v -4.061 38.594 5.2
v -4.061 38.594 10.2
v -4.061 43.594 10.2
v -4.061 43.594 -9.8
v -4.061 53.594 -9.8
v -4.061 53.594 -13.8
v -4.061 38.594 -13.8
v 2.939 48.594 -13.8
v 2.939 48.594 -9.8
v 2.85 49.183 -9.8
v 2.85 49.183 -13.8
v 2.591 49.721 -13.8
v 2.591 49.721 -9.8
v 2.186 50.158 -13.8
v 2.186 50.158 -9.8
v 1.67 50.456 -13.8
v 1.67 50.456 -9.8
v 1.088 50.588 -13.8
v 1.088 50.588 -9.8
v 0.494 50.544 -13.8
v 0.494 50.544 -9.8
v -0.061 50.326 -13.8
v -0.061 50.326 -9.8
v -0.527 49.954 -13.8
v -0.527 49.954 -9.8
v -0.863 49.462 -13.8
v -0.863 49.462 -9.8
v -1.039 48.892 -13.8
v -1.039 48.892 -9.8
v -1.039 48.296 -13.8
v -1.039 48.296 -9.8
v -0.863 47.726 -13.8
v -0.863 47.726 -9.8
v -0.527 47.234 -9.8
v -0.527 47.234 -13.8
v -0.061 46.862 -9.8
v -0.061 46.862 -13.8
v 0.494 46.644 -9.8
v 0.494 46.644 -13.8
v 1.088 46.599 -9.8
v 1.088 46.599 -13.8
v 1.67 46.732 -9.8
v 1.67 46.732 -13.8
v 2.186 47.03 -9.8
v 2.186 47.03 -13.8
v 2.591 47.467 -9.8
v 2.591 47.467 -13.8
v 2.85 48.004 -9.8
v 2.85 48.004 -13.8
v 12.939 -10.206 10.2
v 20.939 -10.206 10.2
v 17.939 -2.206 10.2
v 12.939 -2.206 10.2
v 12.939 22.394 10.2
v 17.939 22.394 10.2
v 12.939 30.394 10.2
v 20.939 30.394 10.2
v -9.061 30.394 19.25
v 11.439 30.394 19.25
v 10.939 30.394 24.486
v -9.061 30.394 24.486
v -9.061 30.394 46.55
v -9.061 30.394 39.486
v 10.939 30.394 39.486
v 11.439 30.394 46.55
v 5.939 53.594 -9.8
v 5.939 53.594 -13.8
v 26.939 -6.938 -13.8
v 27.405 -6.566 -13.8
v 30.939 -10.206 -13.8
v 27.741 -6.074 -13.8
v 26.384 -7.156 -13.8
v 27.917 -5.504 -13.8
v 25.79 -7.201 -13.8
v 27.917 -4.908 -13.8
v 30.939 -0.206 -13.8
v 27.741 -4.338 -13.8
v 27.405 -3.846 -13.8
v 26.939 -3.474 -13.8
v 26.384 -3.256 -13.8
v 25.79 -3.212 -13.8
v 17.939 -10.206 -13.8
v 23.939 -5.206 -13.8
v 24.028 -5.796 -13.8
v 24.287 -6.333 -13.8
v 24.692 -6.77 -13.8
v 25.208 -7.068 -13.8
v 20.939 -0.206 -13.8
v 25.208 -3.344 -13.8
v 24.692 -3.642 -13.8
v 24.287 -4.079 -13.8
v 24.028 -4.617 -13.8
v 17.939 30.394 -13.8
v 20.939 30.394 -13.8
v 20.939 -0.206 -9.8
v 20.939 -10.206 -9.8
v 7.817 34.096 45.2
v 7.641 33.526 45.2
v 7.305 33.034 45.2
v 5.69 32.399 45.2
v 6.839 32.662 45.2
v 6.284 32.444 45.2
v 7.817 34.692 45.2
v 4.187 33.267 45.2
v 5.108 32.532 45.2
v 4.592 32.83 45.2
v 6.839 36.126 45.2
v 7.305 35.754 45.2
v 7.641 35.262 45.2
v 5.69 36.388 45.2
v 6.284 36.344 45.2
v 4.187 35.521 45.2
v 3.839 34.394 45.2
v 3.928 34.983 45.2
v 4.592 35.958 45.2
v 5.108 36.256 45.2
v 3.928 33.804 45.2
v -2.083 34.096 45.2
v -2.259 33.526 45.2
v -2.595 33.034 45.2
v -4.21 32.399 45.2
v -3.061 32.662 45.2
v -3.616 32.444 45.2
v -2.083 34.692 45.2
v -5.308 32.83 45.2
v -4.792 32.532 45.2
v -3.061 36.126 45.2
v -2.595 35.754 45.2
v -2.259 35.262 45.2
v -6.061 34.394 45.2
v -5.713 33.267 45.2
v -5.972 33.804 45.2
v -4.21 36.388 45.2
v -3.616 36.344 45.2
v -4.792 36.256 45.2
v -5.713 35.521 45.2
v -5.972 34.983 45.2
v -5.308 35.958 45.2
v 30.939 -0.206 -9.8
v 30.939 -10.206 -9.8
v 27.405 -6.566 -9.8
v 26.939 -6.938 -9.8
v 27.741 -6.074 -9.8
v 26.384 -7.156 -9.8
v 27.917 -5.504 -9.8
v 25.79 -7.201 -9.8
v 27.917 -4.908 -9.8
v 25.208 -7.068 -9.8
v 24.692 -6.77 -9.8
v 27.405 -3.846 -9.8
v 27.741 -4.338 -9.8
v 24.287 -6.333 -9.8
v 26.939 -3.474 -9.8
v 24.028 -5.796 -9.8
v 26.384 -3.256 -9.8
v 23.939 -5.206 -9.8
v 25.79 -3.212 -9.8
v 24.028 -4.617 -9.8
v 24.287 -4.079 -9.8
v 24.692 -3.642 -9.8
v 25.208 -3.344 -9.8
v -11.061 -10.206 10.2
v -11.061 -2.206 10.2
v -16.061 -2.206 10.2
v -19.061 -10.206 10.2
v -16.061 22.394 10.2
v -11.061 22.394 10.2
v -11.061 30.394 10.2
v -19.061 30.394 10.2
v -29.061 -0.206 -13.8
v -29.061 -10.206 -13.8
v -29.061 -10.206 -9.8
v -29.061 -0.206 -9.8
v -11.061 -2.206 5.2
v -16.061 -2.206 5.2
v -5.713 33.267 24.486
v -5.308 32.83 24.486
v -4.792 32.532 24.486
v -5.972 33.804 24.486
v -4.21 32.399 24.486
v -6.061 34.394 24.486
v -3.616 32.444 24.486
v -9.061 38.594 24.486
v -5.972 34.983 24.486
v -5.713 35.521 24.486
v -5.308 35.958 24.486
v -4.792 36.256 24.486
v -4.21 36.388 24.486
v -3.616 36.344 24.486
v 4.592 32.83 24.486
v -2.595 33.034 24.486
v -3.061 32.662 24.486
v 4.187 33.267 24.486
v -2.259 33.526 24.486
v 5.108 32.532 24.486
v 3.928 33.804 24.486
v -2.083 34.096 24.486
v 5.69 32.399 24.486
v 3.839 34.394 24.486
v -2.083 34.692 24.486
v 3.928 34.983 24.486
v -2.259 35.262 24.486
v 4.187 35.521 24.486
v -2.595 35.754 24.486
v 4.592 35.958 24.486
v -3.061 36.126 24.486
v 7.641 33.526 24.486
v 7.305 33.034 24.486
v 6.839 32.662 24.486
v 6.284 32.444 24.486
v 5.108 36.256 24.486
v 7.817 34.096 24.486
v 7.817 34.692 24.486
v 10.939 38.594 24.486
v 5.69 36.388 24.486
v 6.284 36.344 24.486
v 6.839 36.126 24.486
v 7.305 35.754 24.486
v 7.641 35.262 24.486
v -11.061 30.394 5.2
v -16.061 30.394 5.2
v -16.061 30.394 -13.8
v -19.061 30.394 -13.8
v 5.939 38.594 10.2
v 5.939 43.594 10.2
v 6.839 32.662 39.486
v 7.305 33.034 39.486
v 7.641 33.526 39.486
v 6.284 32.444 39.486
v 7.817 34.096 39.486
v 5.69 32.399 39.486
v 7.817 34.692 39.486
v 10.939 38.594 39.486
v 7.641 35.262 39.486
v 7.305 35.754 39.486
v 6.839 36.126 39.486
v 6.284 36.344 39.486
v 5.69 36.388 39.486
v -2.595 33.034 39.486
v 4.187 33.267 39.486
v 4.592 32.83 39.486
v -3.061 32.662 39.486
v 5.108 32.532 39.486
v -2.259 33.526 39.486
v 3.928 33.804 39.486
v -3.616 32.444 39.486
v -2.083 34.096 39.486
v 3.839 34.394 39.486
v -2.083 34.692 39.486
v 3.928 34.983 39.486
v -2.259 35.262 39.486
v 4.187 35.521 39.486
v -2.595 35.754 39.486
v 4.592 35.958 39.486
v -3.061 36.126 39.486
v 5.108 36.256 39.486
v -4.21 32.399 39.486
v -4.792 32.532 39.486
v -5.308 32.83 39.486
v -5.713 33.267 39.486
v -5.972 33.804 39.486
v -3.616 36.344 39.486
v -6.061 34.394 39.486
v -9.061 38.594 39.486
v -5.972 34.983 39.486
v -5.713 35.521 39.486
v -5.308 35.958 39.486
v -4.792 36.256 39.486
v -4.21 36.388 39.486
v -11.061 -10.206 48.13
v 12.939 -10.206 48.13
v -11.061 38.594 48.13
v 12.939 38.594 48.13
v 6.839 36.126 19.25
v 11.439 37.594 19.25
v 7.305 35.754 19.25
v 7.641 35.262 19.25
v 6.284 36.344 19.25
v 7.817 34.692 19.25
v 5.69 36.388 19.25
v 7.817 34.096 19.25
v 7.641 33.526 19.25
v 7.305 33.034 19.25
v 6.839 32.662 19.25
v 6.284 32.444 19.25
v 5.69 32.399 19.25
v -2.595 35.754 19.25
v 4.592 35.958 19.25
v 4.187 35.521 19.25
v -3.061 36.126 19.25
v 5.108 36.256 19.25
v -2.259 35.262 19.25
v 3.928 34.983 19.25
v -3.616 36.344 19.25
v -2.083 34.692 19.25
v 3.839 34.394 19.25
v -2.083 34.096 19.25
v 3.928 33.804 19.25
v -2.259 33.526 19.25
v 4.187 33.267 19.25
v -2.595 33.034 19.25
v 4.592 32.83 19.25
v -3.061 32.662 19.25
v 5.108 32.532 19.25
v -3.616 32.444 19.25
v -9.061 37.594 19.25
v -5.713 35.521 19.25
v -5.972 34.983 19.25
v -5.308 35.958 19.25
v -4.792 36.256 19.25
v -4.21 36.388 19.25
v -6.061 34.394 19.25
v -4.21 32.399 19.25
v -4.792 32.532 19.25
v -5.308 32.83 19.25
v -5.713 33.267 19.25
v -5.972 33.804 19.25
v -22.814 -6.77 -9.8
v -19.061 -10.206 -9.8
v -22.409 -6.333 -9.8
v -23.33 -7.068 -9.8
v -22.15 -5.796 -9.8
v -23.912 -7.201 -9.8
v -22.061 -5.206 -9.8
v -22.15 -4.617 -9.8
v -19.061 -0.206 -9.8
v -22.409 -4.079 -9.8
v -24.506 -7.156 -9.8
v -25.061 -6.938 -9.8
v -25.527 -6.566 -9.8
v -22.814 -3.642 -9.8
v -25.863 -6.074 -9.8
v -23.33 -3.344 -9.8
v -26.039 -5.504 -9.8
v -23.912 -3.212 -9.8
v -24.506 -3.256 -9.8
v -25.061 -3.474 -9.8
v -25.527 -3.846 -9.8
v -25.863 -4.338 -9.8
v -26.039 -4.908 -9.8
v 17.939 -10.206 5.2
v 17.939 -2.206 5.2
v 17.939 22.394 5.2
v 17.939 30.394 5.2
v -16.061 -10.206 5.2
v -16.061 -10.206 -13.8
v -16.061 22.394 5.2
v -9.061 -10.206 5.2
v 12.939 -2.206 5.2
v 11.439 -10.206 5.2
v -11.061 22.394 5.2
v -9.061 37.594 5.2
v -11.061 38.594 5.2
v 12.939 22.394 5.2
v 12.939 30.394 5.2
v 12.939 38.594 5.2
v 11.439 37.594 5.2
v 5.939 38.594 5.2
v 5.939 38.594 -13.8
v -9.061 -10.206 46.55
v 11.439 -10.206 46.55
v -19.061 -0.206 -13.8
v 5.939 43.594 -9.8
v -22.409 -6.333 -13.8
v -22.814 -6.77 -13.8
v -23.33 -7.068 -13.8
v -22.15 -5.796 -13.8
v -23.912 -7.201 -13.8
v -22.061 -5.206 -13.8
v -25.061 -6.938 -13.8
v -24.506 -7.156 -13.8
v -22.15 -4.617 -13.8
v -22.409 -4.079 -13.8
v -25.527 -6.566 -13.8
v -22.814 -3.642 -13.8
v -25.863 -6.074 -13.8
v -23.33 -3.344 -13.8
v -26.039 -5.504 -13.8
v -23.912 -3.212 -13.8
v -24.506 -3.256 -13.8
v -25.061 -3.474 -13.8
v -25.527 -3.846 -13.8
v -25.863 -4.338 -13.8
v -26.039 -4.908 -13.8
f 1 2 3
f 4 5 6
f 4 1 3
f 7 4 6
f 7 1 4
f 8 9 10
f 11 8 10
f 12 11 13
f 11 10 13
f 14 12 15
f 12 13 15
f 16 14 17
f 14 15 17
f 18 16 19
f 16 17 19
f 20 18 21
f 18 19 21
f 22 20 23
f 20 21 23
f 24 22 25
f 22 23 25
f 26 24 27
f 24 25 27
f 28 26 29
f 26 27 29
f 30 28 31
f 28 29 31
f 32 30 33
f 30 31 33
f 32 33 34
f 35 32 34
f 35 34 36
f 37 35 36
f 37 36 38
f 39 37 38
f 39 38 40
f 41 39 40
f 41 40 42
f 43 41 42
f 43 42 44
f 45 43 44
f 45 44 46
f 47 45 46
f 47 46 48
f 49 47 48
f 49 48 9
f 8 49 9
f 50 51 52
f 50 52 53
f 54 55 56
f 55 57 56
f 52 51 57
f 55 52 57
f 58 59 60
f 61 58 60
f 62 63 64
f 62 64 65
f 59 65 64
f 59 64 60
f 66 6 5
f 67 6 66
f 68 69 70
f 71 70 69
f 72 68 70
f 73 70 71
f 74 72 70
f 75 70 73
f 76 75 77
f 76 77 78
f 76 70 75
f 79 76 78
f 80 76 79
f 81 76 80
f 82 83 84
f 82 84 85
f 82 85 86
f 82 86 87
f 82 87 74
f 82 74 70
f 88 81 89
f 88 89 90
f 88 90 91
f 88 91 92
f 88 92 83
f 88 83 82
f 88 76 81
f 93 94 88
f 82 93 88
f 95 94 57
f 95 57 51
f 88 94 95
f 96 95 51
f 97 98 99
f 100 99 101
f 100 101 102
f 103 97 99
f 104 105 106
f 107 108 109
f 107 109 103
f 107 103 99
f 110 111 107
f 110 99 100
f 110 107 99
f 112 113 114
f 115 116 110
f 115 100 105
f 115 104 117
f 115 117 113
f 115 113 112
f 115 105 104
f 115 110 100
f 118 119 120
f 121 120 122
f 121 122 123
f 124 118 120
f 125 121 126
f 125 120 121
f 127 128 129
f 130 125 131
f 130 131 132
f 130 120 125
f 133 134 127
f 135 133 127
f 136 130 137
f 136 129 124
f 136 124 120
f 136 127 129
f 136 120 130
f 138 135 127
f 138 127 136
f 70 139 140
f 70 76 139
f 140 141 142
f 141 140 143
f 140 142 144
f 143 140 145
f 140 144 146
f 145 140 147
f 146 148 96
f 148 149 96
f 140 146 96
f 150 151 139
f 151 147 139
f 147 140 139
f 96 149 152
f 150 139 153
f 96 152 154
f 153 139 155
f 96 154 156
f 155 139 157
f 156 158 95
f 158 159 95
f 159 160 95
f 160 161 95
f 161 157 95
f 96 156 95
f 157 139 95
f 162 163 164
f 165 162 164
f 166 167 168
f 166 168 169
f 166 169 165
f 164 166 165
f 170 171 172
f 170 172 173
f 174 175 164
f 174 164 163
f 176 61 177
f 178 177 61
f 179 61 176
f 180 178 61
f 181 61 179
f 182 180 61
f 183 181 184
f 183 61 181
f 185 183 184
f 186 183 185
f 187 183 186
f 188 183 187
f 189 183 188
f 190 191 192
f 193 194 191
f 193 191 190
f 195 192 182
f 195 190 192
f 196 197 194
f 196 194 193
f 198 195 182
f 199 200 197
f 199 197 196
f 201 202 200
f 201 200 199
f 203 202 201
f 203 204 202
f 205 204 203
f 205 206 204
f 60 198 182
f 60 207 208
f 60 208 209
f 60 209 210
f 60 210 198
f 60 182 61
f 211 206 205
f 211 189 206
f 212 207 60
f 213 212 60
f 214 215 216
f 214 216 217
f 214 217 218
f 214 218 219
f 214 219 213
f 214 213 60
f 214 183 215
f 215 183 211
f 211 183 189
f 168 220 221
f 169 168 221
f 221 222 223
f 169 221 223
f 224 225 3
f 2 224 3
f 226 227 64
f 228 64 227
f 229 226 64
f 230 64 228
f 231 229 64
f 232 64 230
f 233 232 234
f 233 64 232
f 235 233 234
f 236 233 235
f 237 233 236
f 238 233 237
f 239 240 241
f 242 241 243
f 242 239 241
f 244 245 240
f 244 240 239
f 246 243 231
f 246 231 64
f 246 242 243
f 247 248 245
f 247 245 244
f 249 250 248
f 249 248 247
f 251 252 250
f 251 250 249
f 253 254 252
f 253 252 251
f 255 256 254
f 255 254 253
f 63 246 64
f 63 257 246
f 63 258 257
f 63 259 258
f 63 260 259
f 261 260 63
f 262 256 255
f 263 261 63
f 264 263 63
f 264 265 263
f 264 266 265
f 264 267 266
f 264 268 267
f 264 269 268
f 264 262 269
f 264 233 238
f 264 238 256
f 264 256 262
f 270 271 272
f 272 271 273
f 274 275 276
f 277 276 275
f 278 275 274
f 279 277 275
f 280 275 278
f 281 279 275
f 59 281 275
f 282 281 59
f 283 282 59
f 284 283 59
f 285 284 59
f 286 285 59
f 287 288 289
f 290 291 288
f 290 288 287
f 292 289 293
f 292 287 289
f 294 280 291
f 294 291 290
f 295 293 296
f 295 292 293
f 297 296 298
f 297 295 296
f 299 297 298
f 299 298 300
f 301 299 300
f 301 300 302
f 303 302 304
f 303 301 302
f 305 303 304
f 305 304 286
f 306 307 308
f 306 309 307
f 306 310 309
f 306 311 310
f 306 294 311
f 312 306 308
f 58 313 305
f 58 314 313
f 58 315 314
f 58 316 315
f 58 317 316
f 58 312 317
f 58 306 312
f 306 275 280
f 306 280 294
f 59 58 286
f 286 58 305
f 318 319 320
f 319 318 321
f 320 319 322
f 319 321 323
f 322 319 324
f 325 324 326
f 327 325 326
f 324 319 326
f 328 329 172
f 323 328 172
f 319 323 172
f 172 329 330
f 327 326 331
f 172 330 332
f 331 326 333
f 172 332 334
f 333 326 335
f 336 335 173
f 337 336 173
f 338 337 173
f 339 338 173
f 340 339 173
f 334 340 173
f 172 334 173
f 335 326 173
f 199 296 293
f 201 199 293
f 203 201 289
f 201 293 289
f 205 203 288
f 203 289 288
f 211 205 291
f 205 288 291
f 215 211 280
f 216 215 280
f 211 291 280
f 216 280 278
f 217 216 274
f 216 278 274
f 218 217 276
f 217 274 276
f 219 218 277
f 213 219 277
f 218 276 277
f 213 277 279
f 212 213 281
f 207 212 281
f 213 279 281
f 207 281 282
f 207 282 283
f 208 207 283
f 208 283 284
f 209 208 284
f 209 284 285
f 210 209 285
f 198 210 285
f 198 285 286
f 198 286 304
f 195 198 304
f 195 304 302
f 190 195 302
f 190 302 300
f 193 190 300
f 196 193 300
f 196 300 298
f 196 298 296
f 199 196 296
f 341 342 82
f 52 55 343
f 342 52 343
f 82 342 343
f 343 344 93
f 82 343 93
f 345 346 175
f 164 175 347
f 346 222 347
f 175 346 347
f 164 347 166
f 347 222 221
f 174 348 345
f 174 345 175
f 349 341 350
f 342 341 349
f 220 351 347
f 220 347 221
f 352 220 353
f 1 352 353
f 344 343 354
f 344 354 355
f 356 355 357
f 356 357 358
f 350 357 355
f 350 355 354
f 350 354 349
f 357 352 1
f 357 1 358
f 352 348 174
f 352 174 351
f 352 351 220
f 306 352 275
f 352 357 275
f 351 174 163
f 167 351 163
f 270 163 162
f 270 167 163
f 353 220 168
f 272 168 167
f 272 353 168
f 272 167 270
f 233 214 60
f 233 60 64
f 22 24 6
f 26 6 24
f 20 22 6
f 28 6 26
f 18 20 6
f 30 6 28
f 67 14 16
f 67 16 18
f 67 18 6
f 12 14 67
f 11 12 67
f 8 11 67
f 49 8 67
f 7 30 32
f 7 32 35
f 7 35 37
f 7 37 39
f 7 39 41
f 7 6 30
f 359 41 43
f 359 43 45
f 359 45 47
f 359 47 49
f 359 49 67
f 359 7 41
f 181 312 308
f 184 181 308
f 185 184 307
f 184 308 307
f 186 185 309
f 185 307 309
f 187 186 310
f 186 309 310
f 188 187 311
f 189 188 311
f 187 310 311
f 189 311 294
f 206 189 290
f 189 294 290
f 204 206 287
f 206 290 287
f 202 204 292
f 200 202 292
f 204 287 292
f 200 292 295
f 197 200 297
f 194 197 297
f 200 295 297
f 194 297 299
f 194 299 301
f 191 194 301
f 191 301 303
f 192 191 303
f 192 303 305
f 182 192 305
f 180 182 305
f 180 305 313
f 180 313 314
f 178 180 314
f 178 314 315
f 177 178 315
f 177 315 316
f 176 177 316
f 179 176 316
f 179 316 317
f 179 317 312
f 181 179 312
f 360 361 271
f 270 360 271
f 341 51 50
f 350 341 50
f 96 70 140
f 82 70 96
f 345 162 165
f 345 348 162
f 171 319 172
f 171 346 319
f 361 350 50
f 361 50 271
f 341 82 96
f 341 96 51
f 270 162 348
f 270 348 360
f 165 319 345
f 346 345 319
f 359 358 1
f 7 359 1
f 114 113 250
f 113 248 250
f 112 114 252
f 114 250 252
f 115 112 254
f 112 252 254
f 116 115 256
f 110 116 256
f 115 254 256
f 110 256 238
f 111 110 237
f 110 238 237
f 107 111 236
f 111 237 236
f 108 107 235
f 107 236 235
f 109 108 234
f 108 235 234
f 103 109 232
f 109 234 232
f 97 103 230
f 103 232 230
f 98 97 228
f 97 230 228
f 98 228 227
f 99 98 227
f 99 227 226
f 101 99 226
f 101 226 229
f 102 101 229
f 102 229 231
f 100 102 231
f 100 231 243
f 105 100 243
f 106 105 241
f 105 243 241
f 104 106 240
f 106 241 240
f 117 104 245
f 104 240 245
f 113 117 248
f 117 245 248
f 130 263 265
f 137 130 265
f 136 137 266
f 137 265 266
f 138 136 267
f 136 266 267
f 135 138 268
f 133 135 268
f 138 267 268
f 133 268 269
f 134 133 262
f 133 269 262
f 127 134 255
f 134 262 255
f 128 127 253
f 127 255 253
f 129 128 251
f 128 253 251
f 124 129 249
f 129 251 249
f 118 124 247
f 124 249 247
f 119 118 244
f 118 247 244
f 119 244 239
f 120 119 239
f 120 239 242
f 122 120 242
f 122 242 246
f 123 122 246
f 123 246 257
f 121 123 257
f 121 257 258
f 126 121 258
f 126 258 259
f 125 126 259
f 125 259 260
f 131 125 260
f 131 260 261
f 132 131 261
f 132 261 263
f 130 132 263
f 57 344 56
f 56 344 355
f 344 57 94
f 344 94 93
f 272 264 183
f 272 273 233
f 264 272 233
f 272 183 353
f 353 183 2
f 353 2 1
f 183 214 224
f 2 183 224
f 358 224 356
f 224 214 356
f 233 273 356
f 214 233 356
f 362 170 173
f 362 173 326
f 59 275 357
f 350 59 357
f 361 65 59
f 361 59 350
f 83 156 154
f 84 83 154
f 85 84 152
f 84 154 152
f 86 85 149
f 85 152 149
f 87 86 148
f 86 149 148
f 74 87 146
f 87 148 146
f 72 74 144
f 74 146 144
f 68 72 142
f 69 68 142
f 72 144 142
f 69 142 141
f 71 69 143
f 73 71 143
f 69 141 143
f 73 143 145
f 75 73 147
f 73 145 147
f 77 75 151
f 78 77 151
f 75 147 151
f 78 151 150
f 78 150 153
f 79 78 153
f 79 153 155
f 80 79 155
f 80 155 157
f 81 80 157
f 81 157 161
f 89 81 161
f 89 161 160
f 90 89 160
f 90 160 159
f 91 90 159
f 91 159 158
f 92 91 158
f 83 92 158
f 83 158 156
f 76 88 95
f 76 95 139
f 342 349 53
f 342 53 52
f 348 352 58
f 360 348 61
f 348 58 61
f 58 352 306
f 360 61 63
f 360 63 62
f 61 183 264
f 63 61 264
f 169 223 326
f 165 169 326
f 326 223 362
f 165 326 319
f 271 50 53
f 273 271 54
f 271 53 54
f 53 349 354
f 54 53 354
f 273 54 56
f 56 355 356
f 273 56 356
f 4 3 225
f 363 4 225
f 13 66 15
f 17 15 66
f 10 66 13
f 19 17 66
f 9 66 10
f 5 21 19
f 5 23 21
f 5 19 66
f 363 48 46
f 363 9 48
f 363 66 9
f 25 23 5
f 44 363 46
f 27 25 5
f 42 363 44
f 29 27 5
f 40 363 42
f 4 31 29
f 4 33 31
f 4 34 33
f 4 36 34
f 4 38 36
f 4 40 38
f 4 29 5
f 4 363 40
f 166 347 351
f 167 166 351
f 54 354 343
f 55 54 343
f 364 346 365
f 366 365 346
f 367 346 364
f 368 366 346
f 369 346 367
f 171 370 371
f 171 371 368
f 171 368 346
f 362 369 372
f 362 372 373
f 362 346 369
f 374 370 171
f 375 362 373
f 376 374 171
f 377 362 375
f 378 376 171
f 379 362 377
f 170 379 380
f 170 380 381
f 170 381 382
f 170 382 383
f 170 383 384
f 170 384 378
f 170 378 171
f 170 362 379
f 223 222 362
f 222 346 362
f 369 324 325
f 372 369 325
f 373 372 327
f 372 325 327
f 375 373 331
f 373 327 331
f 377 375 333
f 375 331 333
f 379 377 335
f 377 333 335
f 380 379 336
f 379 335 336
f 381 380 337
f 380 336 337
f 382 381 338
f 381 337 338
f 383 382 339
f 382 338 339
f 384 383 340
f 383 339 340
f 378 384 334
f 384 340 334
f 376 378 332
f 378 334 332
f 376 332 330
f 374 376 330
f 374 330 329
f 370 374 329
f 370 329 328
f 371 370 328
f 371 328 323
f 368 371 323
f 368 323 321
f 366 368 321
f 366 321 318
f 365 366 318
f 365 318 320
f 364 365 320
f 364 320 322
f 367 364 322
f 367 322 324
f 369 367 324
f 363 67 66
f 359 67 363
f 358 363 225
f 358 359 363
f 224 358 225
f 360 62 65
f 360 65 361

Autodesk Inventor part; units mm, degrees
ref_plane "YZ Plane" through (0, 0, 0) normal (1, 0, 0) x (0, 1, 0)
ref_plane "XZ Plane" through (0, 0, 0) normal (0, 1, 0) x (-1, 0, 0)
ref_plane "작업 평면1" through (-9.061, -9.3, 6.3) normal (-1, 0, 0) x (0, 1, 0)
sketch "스케치1" plane through (-9.061, -9.3, 6.3) normal (-1, 0, 0) x (0, 1, 0)
  line L0 (39.3939, -39.95) -> (-0.6061, -39.95)
  line L1 (-0.6061, 0.55) -> (39.3939, 0.55)
  line L2 (-0.6061, -12.65) -> (-7.8061, -12.65)
  line L3 (-7.8061, -12.65) -> (-7.8061, -9.45)
  line L4 (-7.8061, -9.45) -> (-0.6061, -9.45)
  line L5 (19.3939, -39.95) -> (19.3939, 0.55) construction
  line L6 (39.3939, -12.65) -> (46.5939, -12.65)
  line L7 (46.5939, -12.65) -> (46.5939, -9.45)
  line L8 (46.5939, -9.45) -> (39.3939, -9.45)
  line L9 (-0.6061, -39.95) -> (-0.6061, -12.65)
  line L10 (-0.6061, -9.45) -> (-0.6061, 0.55)
  line L11 (39.3939, 0.55) -> (39.3939, -9.45)
  line L12 (39.3939, -12.65) -> (39.3939, -39.95)
  line L13 (-9.1061, 1.1) -> (47.8939, 1.1)
  line L14 (39.6939, 1.1) -> (39.6939, -9.15)
  line L15 (39.6939, -9.15) -> (46.8939, -9.15)
  line L16 (46.8939, -9.15) -> (46.8939, -12.95)
  line L17 (46.8939, -12.95) -> (39.6939, -12.95)
  line L18 (39.6939, -12.95) -> (39.6939, -40.25)
  line L19 (39.6939, -40.25) -> (-0.9061, -40.25)
  line L20 (-0.9061, -40.25) -> (-0.9061, -12.95)
  line L21 (-0.9061, -12.95) -> (-8.1061, -12.95)
  line L22 (-8.1061, -12.95) -> (-8.1061, -9.15)
  line L23 (-8.1061, -9.15) -> (-0.9061, -9.15)
  line L24 (-0.9061, -9.15) -> (-0.9061, 1.1)
  line L25 (47.8939, 2.4305) -> (-9.1061, 2.4305)
  line L26 (-9.1061, 2.4305) -> (-9.1061, -41.8305)
  line L27 (-9.1061, -41.8305) -> (47.8939, -41.8305)
  line L28 (47.8939, -41.8305) -> (47.8939, 2.4305)
  line L29 (39.3939, -19.7) -> (-0.6061, -19.7) construction
  line L30 (39.6939, -26.25) -> (39.6939, -30.25)
  line L31 (-0.8061, 6.3) -> (19.1939, 6.3) projected
  line L32 (7.6194, 1.8) -> (13.6194, 1.8)
  line L33 (7.6194, 1.8) -> (13.6194, 1.8)
  line L34 (7.6194, 1.8) -> (13.6194, 1.8)
  line L35 (-0.9061, -31.1) -> (-4.9061, -31.1)
  line L36 (-4.9061, -31.1) -> (-4.9061, -36.1)
  line L37 (-4.9061, -36.1) -> (-0.9061, -36.1)
  line L38 (6.1939, 1.8) -> (12.1939, 1.8) projected
  point P0 (19.3939, -19.7)
  point P1 (9.1939, 6.3)
  dimension "d0" = 40.5
  dimension "d1" = 40
  dimension "d2" = 3.2
  dimension "d3" = 27.2
  dimension "d6" = 27.3
  dimension "d8" = 0.3
  dimension "d9" = 20.25
  dimension "d23" = 9.8
  dimension "d24" = 26
  dimension "d26" = 5
  dimension "d27" = 4
  dimension "d28" = 4.15
extrude "돌출1" add sketch "스케치1" against normal blind 22 contours L13 L24 L23 L22 L21 L20 L35 L36 L37 L19 L18 L17 L16 L15 L14 L28 L27 L26 | L20 L37 L36 L35
sketch "스케치4" plane through (12.939, -9.3, 6.3) normal (1, 0, 0) x (0, 0, -1)
  line L0 (-12.95, -0.9061) -> (-40.25, -0.9061) projected
  line L1 (-31.1, -0.9061) -> (-31.1, -4.9061) projected
  line L2 (-31.1, -4.9061) -> (-36.1, -4.9061) projected
  line L3 (-36.1, -4.9061) -> (-36.1, -0.9061) projected
  line L4 (-40.25, -0.9061) -> (-12.95, -0.9061) projected
  line L5 (-41.8305, -9.1061) -> (1.1, -9.1061) projected
  line L6 (-31.1, -4.9061) -> (-31.1, -9.1061)
  line L7 (-36.1, -4.9061) -> (-36.1, -9.1061)
  point P0 (6.3, 9.3)
extrude "돌출4" cut sketch "스케치4" against normal blind 22
sketch "스케치2" plane through (-9.061, -9.3, 6.3) normal (-1, 0, 0) x (0, 0, 1)
  line L0 (-1.1, -0.9061) -> (-1.1, -9.1061) projected
  line L1 (-1.1, -9.1061) -> (41.8305, -9.1061) projected
  line L2 (41.8305, -9.1061) -> (41.8305, 47.8939) projected
  line L3 (41.8305, 47.8939) -> (-1.1, 47.8939) projected
  line L4 (-1.1, 47.8939) -> (-1.1, 39.6939) projected
  line L5 (-1.1, 47.8939) -> (41.8305, 47.8939)
  line L6 (41.8305, 47.8939) -> (41.8305, -9.1061)
  line L7 (41.8305, -9.1061) -> (-1.1, -9.1061)
  line L8 (-1.1, -9.1061) -> (-1.1, 47.8939)
  point P0 (-6.3, 9.3)
  point P1 (-1.1, -0.9061)
extrude "돌출2" add sketch "스케치2" along normal blind 2
sketch "스케치3" plane through (12.939, -18.4061, 5.2) normal (0, 0, -1) x (-1, 0, 0)
  line L0 (22, 8.2) -> (0, 8.2) projected
  line L1 (22, 48.8) -> (0, 48.8) projected
  line L2 (22, 48.8) -> (22, 8.2) projected
  circle A0 centre (7.1, 4.2) radius 2
  line L3 (22, 28.5) -> (0, 28.5) construction
  line L4 (0, 8.2) -> (0, 48.8) projected
  circle A1 centre (7.1, 52.8) radius 2
  circle A2 centre (17, 4.2) radius 2
  circle A3 centre (17, 52.8) radius 2
  line L5 (12.05, 8.2) -> (12.05, 48.8)
  point P0 (12.939, 18.4061)
  dimension "d81" = 0
  dimension "d15" = 24.3
  dimension "d16" = 4
  dimension "d88" = 5
  dimension "d89" = 4.95
  dimension "d90" = 9.9
extrude "돌출3" cut sketch "스케치3" against normal blind 40 contours A0 | A1 | A2 | A3
sketch "스케치5" plane through (12.939, -9.3, 6.3) normal (1, 0, 0) x (0, 0, -1)
  line L0 (1.1, -9.1061) -> (1.1, -0.9061) projected
  line L1 (-9.15, -0.9061) -> (-9.15, -8.1061) projected
  line L2 (-36.1, -9.1061) -> (-36.1, -0.9061) projected
  line L3 (-36.1, -0.9061) -> (-40.25, -0.9061) projected
  line L4 (-40.25, -0.9061) -> (-40.25, 39.6939) projected
  line L5 (-40.25, 39.6939) -> (-12.95, 39.6939) projected
  line L6 (-12.95, 39.6939) -> (-12.95, 46.8939) projected
  line L7 (-12.95, 46.8939) -> (-9.15, 46.8939) projected
  line L8 (-9.15, 46.8939) -> (-9.15, 39.6939) projected
  line L9 (-9.15, 39.6939) -> (1.1, 39.6939) projected
  line L10 (1.1, 39.6939) -> (1.1, 47.8939) projected
  line L11 (1.1, 47.8939) -> (-41.8305, 47.8939) projected
  line L12 (-41.8305, 47.8939) -> (-41.8305, -9.1061) projected
  line L13 (-41.8305, -9.1061) -> (-36.1, -9.1061) projected
  line L14 (-12.95, -8.1061) -> (-9.15, -8.1061) projected
  line L15 (-9.15, -8.1061) -> (1.1, -8.1061)
  line L16 (1.1, -8.1061) -> (1.1, 46.8939)
  line L17 (1.1, 46.8939) -> (-9.15, 46.8939)
  line L18 (-9.15, 46.8939) -> (-9.15, -8.1061)
  point P0 (6.3, 9.3)
  point P1 (-9.15, -0.9061)
  point P2 (1.1, -8.1061)
  point P3 (1.1, -0.9061)
  point P4 (1.1, 39.6939)
  point P5 (-9.15, 46.8939)
extrude "돌출5" cut sketch "스케치5" against normal up to surface (22 mm away) contours L15 L1 L18 L9 L16 L0 | L9 L8 L17 L10
sketch "스케치12" plane through (12.939, -10.2061, 46.55) normal (0, 0, -1) x (-1, 0, 0)
  line L0 (22, 40.6) -> (0, 40.6) projected
  line L1 (0, 0) -> (0, 40.6) projected
  line L2 (22, 47.8) -> (0, 47.8) projected
  line L3 (1.5, 48.8) -> (1.5, -8.2)
  line L4 (0, -8.2) -> (24, -8.2) projected
  line L5 (0, -7.2) -> (0, 0) projected
  line L6 (0, -8.2) -> (0, -7.2) projected
  line L7 (0, 40.6) -> (0, 47.8) projected
  line L8 (0, 48.8) -> (24, 48.8) projected
  line L9 (0, 47.8) -> (0, 48.8) projected
  point P0 (12.939, 10.2061)
  point P1 (1.5, 40.6)
  dimension "d55" = 1.5
extrude "돌출12" add sketch "스케치12" along normal blind 41.35
sketch "스케치13" plane through (12.939, -18.4061, 5.2) normal (0, 0, -1) x (-1, 0, 0)
  line L0 (0, 0) -> (0, 57) projected
  line L1 (0, 0) -> (24, 0) projected
  line L2 (24, 57) -> (24, 0) projected
  line L3 (0, 57) -> (24, 57) projected
  line L4 (12, 0) -> (12, 57) construction
  line L5 (24, 28.5) -> (0, 28.5) construction
  line L6 (24, 8.2) -> (32, 8.2)
  line L7 (32, 8.2) -> (32, 16.2)
  line L8 (32, 16.2) -> (24, 16.2)
  line L9 (24, 16.2) -> (24, 8.2)
  line L10 (24, 40.8) -> (24, 48.8)
  line L11 (24, 0) -> (24, 57) projected
  line L12 (24, 48.8) -> (32, 48.8)
  line L13 (32, 48.8) -> (32, 40.8)
  line L14 (32, 40.8) -> (24, 40.8)
  line L15 (7, 57) -> (17, 57)
  line L16 (17, 57) -> (17, 62)
  line L17 (17, 62) -> (7, 62)
  line L18 (7, 62) -> (7, 57)
  point P0 (12.939, 18.4061)
  dimension "d70" = 8
  dimension "d71" = 8
  dimension "d72" = 8.2
  dimension "d73" = 10
  dimension "d74" = 5
extrude "돌출13" add sketch "스케치13" against normal blind 5 contours L18 L17 L16 L3 | L2 L8 L7 L6 | L2 L12 L13 L14
sketch "스케치14" plane through (-19.061, -10.2061, 5.2) normal (-1, 0, 0) x (0, 0, 1)
  line L0 (-34, 162.6) -> (-34, -37.7889) projected
  line L1 (-34, -37.7889) -> (-19, -37.7889) projected
  line L2 (-19, 162.6) -> (-19, -37.7889) projected
  line L3 (-34, 162.6) -> (-19, 162.6) projected
  line L4 (5, 0) -> (-19, 0)
  line L5 (-19, 0) -> (-19, 40.6)
  line L6 (-19, 40.6) -> (5, 40.6)
  line L7 (5, 40.6) -> (5, 0)
  line L8 (0, 32.6) -> (0, 40.6) projected
  line L9 (0, 32.6) -> (5, 32.6) projected
  line L10 (5, 40.6) -> (5, 32.6) projected
  line L11 (0, 40.6) -> (5, 40.6) projected
  point P0 (-5.2, 10.2061)
  point P1 (-19, 0)
extrude "돌출14" add sketch "스케치14" against normal blind 3 contours L6 L8 L9 L7 L4 L2 | L6 L7 L9 L8
sketch "스케치15" plane through (-19.061, -10.2061, -13.8) normal (0, 0, -1) x (-1, 0, 0)
  line L0 (0, 40.6) -> (0, 0) projected
  line L1 (0, 0) -> (10, 0)
  line L2 (10, 0) -> (10, 10)
  line L3 (10, 10) -> (0, 10)
  line L4 (0, 10) -> (0, 0)
  point P0 (-19.061, 10.2061)
  point P1 (0, 10)
  dimension "d66" = 10
  dimension "d67" = 10
extrude "돌출15" add sketch "스케치15" against normal blind 4
sketch "스케치16" plane through (12.939, -18.4061, 5.2) normal (0, 0, -1) x (-1, 0, 0)
  line L0 (17, 57) -> (17, 62) projected
  line L1 (17, 62) -> (7, 62) projected
  line L2 (7, 62) -> (7, 57) projected
  line L3 (7, 57) -> (17, 57) projected
  point P0 (12.939, 18.4061)
ref_plane "작업 평면2" through (-79.061, -70.6061, -13.8) normal (0, 0, 1) x (1, 0, 0)
extrude "돌출16" add sketch "스케치16" along normal up to surface (19 mm away)
sketch "스케치17" plane through (-4.061, 43.5939, 10.2) normal (0, 1, 0) x (1, 0, 0)
  line L0 (0, 0) -> (0, 24) projected
  line L1 (10, 24) -> (10, 0) projected
  line L2 (0, 24) -> (10, 24) projected
  line L3 (10, 20) -> (0, 20)
  point P0 (4.061, 10.2)
  dimension "d77" = 4
extrude "돌출17" add sketch "스케치17" along normal blind 10
sketch "스케치18" plane through (-19.061, -10.2061, -9.8) normal (0, 0, 1) x (1, 0, 0)
  circle A0 centre (-5, 5) radius 2
  point P0 (19.061, 10.2061)
  dimension "d80" = 4
extrude "돌출18" cut sketch "스케치18" against normal through all
ref_plane "작업 평면3" through (0.939, -9.3, 6.3) normal (1, 0, 0) x (0, 0, -1)
sketch "스케치19" plane through (-4.061, 43.5939, -9.8) normal (0, 0, 1) x (1, 0, 0)
  line L0 (0, 10) -> (10, 10) projected
  line L1 (0, 0) -> (0, 10) projected
  circle A0 centre (5, 5) radius 2
  point P0 (4.061, -43.5939)
  dimension "d83" = 4
  dimension "d84" = 5
  dimension "d85" = 5
extrude "돌출19" cut sketch "스케치19" against normal through all
mirror "미러1" about plane through (0.939, -9.3, 6.3) normal (1, 0, 0) of "돌출13", "돌출14", "돌출15", "돌출18"
ref_plane "작업 평면4" through (20.939, -10.2061, 10.2) normal (0, -1, 0) x (1, 0, 0)
split "분할1" plane through (20.939, -10.2061, 10.2) removes the side toward (0, -1, 0)
sketch "스케치20" plane through (12.939, 38.5939, 48.1305) normal (0, 1, 0) x (1, 0, 0)
  line L0 (-22, 1.5805) -> (-22, 42.9305) projected
  line L1 (-22, 23.6445) -> (-2, 23.6445)
  line L2 (-2, 23.6445) -> (-2, 8.6445)
  line L3 (-2, 8.6445) -> (-22, 8.6445)
  line L4 (-22, 8.6445) -> (-22, 23.6445)
  point P0 (-12.939, 48.1305)
  point P1 (-22, 8.6445)
  dimension "d91" = 15
  dimension "d92" = 20
extrude "돌출20" cut sketch "스케치20" against normal blind 10
properties part number "SAFRS-P-0012"
